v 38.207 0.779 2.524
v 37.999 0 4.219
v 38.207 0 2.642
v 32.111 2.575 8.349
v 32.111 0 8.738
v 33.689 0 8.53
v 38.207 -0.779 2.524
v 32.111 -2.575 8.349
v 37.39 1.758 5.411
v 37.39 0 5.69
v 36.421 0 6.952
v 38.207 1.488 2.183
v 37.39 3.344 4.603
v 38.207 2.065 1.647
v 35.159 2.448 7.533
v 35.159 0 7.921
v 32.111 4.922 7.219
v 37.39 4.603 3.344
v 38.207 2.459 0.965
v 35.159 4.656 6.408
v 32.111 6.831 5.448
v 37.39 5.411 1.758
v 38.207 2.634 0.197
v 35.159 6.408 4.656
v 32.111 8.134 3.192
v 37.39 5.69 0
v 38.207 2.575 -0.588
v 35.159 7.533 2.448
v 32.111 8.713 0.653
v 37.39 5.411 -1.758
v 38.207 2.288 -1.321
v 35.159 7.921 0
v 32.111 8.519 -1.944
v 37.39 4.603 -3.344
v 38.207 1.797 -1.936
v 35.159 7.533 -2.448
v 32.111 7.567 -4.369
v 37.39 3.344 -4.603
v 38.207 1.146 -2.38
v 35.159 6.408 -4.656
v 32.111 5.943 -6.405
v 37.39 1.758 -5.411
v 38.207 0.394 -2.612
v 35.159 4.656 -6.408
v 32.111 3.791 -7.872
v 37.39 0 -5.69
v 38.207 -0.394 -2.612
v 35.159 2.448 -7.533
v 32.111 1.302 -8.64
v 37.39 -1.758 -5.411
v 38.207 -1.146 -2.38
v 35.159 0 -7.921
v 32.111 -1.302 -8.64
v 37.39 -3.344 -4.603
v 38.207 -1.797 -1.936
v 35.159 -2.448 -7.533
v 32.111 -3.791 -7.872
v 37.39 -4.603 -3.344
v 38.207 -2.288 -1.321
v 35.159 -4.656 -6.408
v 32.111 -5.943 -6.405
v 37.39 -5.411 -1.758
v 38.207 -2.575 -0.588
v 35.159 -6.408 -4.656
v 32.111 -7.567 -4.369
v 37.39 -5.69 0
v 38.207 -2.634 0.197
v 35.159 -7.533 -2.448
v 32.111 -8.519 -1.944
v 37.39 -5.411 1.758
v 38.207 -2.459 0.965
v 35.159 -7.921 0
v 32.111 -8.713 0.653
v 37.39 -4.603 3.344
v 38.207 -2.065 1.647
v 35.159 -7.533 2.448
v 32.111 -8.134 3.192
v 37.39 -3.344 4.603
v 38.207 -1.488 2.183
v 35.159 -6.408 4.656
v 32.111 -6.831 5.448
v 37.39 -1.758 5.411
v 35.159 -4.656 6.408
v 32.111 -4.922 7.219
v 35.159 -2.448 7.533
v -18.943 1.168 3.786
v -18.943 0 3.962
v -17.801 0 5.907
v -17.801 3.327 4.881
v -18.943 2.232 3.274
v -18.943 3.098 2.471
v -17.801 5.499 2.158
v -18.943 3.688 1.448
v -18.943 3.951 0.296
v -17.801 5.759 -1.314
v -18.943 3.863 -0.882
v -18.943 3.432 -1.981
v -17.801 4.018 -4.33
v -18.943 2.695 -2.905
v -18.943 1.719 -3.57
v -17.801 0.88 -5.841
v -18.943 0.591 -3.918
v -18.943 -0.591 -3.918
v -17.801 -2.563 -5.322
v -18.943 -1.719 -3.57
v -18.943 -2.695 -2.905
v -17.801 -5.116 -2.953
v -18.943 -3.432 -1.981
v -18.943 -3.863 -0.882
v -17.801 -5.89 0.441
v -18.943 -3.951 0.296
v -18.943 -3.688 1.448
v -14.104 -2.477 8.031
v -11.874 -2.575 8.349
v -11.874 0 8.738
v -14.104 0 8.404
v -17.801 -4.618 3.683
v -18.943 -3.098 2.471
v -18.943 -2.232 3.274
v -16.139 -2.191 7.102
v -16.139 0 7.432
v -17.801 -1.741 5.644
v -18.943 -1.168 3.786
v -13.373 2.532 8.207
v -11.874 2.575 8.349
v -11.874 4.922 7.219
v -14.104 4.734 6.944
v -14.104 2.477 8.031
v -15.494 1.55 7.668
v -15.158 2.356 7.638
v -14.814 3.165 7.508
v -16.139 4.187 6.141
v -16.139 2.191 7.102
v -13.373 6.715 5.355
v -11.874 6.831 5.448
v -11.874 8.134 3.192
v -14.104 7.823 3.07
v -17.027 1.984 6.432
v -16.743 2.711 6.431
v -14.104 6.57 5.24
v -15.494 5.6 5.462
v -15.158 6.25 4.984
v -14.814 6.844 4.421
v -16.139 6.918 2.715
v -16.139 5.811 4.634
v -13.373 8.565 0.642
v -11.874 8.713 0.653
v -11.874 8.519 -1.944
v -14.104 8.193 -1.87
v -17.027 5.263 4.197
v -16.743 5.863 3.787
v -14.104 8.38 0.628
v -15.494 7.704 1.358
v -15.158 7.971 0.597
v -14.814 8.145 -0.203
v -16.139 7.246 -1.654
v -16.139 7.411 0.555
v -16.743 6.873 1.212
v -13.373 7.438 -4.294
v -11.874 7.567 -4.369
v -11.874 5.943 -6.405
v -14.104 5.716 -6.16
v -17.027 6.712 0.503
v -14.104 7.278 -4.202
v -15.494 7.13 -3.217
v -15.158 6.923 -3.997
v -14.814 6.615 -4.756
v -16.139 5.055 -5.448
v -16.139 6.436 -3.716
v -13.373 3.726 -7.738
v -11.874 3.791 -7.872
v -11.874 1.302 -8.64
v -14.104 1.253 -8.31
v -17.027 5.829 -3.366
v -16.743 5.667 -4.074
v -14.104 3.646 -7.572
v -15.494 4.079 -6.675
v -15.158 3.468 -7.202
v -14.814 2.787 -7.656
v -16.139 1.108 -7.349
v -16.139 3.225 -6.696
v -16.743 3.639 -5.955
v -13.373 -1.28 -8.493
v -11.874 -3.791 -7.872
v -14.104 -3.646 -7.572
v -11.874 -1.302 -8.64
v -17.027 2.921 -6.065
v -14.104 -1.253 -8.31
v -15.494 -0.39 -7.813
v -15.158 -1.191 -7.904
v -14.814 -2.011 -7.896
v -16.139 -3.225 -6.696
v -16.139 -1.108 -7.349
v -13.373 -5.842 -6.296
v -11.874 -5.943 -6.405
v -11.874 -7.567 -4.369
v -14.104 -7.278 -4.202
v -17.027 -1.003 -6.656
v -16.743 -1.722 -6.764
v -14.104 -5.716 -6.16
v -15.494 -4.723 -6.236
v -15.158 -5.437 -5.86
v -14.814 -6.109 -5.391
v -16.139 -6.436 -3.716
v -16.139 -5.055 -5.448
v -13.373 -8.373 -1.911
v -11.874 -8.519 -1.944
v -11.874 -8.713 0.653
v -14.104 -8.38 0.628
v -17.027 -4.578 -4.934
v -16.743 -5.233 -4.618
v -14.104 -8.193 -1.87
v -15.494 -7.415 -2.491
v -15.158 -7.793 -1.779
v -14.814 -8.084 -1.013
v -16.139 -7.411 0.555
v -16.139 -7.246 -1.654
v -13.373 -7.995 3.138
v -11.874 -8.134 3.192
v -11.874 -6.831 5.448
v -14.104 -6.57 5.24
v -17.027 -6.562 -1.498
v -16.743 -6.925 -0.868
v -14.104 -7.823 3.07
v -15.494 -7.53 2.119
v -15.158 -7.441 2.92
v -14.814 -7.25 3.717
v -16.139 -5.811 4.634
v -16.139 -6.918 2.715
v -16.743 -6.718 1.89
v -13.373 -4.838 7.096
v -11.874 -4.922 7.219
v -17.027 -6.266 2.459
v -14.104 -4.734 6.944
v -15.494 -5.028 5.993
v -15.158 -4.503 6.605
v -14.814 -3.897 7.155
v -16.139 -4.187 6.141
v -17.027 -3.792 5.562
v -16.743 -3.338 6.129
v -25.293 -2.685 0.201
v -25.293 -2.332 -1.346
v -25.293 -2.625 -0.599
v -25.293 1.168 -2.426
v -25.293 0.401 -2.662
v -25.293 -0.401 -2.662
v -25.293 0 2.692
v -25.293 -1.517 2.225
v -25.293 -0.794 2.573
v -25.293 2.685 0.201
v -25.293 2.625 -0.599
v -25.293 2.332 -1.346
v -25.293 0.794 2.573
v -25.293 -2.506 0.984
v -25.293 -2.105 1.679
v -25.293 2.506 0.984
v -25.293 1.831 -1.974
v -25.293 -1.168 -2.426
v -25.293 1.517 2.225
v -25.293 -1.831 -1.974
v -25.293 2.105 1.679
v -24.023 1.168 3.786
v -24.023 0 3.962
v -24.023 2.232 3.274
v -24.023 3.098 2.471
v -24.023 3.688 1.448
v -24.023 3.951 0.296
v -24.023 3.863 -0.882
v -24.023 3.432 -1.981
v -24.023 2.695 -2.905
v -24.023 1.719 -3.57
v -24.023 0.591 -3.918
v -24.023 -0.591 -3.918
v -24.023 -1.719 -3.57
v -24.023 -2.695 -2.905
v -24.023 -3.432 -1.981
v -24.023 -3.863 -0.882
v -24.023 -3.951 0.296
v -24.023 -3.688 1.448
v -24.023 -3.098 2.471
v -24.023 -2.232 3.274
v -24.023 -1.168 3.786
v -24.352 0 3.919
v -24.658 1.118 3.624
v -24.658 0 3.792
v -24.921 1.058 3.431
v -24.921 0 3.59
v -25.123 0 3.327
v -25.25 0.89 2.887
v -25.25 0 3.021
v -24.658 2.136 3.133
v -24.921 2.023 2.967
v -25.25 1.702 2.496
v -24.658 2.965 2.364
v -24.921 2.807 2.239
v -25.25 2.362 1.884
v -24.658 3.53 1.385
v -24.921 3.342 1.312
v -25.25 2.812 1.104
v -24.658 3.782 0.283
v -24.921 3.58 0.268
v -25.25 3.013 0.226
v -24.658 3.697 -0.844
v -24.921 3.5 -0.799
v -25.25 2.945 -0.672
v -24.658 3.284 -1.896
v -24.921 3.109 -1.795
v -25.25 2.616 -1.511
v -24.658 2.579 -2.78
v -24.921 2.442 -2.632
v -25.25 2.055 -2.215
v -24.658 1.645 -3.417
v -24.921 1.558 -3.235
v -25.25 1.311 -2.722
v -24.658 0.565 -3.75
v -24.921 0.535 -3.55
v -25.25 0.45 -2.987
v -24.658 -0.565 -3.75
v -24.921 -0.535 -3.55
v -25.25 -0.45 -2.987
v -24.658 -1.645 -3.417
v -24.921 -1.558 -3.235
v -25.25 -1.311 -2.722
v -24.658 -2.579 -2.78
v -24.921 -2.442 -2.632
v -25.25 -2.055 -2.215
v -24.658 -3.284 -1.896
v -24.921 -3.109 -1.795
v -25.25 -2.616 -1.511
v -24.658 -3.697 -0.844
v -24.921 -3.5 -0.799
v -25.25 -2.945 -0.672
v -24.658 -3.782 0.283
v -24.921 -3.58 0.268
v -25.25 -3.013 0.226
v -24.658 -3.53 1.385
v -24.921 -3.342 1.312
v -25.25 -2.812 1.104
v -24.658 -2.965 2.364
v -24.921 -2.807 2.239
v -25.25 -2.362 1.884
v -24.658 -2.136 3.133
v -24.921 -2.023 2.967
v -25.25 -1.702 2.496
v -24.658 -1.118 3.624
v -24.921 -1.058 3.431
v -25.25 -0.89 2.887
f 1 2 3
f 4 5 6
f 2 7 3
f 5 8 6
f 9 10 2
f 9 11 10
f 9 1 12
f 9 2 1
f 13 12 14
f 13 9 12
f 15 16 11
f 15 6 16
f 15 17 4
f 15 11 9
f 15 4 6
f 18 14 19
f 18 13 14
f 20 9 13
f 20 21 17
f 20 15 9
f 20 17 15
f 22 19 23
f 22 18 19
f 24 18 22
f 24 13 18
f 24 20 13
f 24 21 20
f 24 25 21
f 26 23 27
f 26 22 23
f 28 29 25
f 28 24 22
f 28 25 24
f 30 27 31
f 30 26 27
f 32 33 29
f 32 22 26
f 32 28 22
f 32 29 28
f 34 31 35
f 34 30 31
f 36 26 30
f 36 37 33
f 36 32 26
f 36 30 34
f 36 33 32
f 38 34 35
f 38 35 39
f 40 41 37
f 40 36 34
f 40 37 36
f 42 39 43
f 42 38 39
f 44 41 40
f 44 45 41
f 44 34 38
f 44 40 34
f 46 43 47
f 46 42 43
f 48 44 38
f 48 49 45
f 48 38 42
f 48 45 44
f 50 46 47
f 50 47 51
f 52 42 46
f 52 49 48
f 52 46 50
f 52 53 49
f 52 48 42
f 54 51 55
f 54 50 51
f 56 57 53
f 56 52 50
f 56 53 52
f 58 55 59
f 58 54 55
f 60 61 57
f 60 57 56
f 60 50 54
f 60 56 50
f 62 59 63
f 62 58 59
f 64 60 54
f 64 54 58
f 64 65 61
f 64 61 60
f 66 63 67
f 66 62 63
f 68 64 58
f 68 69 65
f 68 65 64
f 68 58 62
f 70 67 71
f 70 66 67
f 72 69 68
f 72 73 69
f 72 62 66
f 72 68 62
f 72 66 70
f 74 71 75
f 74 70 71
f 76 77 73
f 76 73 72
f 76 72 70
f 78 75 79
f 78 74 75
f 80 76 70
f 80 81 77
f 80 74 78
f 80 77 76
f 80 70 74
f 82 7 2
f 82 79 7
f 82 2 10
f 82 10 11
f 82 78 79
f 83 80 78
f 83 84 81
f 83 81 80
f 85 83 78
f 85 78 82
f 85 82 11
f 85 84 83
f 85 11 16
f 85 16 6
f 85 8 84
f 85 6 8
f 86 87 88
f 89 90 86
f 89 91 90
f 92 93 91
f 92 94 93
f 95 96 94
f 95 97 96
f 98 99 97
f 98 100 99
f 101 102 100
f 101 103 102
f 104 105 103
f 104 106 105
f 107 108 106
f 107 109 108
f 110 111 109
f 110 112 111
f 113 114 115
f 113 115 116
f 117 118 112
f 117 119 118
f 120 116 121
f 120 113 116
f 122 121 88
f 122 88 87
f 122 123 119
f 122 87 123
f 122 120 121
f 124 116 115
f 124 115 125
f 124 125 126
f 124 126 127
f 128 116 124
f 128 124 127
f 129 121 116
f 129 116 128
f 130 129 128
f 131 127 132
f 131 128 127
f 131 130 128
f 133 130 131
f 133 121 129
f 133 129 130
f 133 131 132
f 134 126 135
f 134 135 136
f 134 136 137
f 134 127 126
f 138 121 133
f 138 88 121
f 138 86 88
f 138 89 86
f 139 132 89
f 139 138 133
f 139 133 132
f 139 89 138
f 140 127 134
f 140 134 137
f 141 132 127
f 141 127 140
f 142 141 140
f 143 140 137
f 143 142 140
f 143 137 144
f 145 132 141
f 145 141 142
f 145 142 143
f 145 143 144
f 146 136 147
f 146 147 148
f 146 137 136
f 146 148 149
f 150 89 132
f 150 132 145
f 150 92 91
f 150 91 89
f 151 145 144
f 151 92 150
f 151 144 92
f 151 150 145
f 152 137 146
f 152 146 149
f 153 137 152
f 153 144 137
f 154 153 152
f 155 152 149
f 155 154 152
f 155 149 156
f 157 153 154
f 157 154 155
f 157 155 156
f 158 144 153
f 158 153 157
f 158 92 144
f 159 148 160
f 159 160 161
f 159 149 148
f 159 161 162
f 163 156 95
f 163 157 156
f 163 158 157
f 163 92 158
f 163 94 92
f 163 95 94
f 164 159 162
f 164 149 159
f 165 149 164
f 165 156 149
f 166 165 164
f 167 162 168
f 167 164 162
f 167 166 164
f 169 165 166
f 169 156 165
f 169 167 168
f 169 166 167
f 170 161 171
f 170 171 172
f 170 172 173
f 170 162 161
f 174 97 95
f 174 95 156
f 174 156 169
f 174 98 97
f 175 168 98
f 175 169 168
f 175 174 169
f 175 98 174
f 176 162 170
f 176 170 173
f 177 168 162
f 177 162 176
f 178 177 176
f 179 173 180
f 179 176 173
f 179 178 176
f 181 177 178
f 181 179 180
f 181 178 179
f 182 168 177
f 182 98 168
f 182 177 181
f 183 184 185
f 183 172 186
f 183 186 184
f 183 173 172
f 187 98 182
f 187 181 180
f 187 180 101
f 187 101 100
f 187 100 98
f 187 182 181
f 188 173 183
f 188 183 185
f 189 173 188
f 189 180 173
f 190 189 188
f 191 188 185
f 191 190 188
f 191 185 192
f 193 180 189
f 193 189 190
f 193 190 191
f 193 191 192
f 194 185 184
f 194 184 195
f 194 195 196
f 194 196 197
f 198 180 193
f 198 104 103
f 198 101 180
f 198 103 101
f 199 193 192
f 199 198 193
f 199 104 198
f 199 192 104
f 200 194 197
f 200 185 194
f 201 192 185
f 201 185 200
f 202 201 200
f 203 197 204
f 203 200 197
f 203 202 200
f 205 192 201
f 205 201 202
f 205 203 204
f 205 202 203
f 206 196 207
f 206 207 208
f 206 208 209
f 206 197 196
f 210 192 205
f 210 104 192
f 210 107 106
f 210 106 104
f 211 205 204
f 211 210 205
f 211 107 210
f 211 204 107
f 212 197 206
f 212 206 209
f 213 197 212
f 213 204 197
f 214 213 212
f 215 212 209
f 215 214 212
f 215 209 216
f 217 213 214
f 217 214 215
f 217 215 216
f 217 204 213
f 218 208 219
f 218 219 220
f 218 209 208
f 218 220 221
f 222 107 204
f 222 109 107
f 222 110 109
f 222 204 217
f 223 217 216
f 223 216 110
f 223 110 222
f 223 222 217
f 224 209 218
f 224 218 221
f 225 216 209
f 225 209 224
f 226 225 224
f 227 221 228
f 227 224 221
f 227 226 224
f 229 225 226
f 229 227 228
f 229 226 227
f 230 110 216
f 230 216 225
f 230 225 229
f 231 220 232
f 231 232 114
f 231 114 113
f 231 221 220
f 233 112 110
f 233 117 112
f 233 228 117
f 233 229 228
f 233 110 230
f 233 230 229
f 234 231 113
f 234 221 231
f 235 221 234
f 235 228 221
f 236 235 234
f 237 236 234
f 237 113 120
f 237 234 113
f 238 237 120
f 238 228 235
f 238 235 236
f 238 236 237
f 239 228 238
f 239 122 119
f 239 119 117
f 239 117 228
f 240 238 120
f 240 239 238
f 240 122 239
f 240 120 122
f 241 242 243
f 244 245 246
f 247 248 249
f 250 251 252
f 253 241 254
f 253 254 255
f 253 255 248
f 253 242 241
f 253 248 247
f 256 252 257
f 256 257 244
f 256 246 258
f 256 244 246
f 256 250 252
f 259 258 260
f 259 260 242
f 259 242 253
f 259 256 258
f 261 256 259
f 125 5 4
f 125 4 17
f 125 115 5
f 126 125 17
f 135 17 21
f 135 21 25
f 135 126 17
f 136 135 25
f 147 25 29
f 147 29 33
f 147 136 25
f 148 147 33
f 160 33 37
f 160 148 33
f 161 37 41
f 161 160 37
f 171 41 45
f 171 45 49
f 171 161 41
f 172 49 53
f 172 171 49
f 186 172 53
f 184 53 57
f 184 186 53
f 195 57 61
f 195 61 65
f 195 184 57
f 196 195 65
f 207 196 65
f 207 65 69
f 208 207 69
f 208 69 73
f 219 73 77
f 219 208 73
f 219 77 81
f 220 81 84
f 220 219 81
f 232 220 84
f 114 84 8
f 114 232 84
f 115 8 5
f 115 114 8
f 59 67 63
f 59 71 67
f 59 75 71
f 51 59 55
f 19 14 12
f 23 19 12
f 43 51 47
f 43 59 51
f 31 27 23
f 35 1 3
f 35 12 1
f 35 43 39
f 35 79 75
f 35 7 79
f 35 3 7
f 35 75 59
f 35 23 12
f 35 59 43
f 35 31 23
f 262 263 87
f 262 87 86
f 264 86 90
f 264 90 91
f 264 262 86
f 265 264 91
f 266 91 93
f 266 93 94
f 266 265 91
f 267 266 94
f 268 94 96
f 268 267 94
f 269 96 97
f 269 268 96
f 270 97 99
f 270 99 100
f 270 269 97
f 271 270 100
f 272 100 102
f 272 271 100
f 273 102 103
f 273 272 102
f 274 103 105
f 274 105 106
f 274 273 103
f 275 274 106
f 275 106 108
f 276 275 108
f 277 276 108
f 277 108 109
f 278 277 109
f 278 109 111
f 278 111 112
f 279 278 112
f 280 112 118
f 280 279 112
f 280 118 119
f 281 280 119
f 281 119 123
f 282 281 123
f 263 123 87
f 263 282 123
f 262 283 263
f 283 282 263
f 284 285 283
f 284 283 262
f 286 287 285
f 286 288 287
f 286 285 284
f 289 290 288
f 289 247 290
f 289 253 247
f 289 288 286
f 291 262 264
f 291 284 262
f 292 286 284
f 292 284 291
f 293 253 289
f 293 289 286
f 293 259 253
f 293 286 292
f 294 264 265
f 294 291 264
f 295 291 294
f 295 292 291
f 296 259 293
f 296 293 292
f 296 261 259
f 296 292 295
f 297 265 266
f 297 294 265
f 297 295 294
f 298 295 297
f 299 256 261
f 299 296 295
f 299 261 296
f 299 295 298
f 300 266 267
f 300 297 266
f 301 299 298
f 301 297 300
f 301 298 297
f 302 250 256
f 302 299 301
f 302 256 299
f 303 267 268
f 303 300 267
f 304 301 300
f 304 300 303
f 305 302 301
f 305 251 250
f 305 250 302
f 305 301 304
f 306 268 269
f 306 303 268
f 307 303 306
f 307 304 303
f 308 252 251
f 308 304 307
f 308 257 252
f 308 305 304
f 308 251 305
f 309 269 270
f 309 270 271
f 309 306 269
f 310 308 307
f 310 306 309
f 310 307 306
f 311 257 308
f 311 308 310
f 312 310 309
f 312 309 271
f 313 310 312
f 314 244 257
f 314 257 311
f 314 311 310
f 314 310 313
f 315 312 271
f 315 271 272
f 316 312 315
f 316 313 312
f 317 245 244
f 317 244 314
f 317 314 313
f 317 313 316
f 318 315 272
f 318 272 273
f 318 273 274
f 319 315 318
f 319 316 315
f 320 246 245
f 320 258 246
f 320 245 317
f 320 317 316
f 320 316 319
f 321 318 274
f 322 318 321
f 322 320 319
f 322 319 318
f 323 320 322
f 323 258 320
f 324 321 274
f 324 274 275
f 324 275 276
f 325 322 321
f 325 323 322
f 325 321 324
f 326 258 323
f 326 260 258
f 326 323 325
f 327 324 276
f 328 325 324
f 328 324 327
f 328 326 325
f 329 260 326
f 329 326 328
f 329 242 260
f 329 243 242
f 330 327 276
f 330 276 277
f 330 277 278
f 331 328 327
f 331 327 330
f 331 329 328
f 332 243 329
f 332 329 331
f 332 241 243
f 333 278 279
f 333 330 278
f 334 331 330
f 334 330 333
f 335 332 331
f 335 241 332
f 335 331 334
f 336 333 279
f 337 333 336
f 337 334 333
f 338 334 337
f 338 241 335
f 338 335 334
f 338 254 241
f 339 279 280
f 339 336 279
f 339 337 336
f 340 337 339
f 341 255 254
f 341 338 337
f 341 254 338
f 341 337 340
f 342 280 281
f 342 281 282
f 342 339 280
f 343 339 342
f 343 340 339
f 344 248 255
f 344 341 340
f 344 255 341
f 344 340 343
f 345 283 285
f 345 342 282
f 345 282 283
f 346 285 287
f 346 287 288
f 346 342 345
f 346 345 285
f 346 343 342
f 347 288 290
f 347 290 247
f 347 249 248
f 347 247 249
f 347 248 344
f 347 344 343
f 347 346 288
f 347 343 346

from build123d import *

# Parameters (mm, degrees)
F2_R = 6.096
F4_R = 1.27


# Not quite as in the source:
# - a fillet or chamfer that OpenCascade refuses, or shapes differently, is made with other operations: its cross-section is extruded or revolved along the edge and cut away or added


with BuildPart() as f1:
    # F0 (on Front) → F1 (revolve)
    with BuildSketch(Plane.XZ):
        Polygon((38.2069466584, 0), (38.2069466584, 8.7376), (-18.9430533416, 8.7376), (-18.9430533416, 3.9624), (-25.2930533416, 3.9624), (-25.2930533416, 0), align=None)
    revolve(axis=Axis((6.4569466584, 0, 0), (-1, 0, 0)))

    # F2
    f2_edges = [f1.edges().sort_by_distance(p)[0] for p in [
        (38.206947, 0, -8.7376),
    ]]
    fillet(f2_edges, radius=F2_R)

    # F3: fillet of radius 7.62 on 1 edges, made by hand

    # F3_s1 → F3_t2 (revolve, cut)
    with BuildSketch(Plane.XZ):
        with BuildLine():
            ThreePointArc((-11.8740001546, 8.7376), (-16.139385483, 7.4319398705), (-18.9430533416, 3.9624))
            Line((-18.9430533416, 3.9624), (-18.9430533416, 8.7376))
            Line((-18.9430533416, 8.7376), (-11.8740001546, 8.7376))
        make_face()
    revolve(axis=Axis((-18.9430533416, 0, 0), (-1, 0, 0)), mode=Mode.SUBTRACT)

    # F4
    f4_edges = [f1.edges().sort_by_distance(p)[0] for p in [
        (-25.293053, 0, -3.9624),
    ]]
    fillet(f4_edges, radius=F4_R)


solid = f1.part
